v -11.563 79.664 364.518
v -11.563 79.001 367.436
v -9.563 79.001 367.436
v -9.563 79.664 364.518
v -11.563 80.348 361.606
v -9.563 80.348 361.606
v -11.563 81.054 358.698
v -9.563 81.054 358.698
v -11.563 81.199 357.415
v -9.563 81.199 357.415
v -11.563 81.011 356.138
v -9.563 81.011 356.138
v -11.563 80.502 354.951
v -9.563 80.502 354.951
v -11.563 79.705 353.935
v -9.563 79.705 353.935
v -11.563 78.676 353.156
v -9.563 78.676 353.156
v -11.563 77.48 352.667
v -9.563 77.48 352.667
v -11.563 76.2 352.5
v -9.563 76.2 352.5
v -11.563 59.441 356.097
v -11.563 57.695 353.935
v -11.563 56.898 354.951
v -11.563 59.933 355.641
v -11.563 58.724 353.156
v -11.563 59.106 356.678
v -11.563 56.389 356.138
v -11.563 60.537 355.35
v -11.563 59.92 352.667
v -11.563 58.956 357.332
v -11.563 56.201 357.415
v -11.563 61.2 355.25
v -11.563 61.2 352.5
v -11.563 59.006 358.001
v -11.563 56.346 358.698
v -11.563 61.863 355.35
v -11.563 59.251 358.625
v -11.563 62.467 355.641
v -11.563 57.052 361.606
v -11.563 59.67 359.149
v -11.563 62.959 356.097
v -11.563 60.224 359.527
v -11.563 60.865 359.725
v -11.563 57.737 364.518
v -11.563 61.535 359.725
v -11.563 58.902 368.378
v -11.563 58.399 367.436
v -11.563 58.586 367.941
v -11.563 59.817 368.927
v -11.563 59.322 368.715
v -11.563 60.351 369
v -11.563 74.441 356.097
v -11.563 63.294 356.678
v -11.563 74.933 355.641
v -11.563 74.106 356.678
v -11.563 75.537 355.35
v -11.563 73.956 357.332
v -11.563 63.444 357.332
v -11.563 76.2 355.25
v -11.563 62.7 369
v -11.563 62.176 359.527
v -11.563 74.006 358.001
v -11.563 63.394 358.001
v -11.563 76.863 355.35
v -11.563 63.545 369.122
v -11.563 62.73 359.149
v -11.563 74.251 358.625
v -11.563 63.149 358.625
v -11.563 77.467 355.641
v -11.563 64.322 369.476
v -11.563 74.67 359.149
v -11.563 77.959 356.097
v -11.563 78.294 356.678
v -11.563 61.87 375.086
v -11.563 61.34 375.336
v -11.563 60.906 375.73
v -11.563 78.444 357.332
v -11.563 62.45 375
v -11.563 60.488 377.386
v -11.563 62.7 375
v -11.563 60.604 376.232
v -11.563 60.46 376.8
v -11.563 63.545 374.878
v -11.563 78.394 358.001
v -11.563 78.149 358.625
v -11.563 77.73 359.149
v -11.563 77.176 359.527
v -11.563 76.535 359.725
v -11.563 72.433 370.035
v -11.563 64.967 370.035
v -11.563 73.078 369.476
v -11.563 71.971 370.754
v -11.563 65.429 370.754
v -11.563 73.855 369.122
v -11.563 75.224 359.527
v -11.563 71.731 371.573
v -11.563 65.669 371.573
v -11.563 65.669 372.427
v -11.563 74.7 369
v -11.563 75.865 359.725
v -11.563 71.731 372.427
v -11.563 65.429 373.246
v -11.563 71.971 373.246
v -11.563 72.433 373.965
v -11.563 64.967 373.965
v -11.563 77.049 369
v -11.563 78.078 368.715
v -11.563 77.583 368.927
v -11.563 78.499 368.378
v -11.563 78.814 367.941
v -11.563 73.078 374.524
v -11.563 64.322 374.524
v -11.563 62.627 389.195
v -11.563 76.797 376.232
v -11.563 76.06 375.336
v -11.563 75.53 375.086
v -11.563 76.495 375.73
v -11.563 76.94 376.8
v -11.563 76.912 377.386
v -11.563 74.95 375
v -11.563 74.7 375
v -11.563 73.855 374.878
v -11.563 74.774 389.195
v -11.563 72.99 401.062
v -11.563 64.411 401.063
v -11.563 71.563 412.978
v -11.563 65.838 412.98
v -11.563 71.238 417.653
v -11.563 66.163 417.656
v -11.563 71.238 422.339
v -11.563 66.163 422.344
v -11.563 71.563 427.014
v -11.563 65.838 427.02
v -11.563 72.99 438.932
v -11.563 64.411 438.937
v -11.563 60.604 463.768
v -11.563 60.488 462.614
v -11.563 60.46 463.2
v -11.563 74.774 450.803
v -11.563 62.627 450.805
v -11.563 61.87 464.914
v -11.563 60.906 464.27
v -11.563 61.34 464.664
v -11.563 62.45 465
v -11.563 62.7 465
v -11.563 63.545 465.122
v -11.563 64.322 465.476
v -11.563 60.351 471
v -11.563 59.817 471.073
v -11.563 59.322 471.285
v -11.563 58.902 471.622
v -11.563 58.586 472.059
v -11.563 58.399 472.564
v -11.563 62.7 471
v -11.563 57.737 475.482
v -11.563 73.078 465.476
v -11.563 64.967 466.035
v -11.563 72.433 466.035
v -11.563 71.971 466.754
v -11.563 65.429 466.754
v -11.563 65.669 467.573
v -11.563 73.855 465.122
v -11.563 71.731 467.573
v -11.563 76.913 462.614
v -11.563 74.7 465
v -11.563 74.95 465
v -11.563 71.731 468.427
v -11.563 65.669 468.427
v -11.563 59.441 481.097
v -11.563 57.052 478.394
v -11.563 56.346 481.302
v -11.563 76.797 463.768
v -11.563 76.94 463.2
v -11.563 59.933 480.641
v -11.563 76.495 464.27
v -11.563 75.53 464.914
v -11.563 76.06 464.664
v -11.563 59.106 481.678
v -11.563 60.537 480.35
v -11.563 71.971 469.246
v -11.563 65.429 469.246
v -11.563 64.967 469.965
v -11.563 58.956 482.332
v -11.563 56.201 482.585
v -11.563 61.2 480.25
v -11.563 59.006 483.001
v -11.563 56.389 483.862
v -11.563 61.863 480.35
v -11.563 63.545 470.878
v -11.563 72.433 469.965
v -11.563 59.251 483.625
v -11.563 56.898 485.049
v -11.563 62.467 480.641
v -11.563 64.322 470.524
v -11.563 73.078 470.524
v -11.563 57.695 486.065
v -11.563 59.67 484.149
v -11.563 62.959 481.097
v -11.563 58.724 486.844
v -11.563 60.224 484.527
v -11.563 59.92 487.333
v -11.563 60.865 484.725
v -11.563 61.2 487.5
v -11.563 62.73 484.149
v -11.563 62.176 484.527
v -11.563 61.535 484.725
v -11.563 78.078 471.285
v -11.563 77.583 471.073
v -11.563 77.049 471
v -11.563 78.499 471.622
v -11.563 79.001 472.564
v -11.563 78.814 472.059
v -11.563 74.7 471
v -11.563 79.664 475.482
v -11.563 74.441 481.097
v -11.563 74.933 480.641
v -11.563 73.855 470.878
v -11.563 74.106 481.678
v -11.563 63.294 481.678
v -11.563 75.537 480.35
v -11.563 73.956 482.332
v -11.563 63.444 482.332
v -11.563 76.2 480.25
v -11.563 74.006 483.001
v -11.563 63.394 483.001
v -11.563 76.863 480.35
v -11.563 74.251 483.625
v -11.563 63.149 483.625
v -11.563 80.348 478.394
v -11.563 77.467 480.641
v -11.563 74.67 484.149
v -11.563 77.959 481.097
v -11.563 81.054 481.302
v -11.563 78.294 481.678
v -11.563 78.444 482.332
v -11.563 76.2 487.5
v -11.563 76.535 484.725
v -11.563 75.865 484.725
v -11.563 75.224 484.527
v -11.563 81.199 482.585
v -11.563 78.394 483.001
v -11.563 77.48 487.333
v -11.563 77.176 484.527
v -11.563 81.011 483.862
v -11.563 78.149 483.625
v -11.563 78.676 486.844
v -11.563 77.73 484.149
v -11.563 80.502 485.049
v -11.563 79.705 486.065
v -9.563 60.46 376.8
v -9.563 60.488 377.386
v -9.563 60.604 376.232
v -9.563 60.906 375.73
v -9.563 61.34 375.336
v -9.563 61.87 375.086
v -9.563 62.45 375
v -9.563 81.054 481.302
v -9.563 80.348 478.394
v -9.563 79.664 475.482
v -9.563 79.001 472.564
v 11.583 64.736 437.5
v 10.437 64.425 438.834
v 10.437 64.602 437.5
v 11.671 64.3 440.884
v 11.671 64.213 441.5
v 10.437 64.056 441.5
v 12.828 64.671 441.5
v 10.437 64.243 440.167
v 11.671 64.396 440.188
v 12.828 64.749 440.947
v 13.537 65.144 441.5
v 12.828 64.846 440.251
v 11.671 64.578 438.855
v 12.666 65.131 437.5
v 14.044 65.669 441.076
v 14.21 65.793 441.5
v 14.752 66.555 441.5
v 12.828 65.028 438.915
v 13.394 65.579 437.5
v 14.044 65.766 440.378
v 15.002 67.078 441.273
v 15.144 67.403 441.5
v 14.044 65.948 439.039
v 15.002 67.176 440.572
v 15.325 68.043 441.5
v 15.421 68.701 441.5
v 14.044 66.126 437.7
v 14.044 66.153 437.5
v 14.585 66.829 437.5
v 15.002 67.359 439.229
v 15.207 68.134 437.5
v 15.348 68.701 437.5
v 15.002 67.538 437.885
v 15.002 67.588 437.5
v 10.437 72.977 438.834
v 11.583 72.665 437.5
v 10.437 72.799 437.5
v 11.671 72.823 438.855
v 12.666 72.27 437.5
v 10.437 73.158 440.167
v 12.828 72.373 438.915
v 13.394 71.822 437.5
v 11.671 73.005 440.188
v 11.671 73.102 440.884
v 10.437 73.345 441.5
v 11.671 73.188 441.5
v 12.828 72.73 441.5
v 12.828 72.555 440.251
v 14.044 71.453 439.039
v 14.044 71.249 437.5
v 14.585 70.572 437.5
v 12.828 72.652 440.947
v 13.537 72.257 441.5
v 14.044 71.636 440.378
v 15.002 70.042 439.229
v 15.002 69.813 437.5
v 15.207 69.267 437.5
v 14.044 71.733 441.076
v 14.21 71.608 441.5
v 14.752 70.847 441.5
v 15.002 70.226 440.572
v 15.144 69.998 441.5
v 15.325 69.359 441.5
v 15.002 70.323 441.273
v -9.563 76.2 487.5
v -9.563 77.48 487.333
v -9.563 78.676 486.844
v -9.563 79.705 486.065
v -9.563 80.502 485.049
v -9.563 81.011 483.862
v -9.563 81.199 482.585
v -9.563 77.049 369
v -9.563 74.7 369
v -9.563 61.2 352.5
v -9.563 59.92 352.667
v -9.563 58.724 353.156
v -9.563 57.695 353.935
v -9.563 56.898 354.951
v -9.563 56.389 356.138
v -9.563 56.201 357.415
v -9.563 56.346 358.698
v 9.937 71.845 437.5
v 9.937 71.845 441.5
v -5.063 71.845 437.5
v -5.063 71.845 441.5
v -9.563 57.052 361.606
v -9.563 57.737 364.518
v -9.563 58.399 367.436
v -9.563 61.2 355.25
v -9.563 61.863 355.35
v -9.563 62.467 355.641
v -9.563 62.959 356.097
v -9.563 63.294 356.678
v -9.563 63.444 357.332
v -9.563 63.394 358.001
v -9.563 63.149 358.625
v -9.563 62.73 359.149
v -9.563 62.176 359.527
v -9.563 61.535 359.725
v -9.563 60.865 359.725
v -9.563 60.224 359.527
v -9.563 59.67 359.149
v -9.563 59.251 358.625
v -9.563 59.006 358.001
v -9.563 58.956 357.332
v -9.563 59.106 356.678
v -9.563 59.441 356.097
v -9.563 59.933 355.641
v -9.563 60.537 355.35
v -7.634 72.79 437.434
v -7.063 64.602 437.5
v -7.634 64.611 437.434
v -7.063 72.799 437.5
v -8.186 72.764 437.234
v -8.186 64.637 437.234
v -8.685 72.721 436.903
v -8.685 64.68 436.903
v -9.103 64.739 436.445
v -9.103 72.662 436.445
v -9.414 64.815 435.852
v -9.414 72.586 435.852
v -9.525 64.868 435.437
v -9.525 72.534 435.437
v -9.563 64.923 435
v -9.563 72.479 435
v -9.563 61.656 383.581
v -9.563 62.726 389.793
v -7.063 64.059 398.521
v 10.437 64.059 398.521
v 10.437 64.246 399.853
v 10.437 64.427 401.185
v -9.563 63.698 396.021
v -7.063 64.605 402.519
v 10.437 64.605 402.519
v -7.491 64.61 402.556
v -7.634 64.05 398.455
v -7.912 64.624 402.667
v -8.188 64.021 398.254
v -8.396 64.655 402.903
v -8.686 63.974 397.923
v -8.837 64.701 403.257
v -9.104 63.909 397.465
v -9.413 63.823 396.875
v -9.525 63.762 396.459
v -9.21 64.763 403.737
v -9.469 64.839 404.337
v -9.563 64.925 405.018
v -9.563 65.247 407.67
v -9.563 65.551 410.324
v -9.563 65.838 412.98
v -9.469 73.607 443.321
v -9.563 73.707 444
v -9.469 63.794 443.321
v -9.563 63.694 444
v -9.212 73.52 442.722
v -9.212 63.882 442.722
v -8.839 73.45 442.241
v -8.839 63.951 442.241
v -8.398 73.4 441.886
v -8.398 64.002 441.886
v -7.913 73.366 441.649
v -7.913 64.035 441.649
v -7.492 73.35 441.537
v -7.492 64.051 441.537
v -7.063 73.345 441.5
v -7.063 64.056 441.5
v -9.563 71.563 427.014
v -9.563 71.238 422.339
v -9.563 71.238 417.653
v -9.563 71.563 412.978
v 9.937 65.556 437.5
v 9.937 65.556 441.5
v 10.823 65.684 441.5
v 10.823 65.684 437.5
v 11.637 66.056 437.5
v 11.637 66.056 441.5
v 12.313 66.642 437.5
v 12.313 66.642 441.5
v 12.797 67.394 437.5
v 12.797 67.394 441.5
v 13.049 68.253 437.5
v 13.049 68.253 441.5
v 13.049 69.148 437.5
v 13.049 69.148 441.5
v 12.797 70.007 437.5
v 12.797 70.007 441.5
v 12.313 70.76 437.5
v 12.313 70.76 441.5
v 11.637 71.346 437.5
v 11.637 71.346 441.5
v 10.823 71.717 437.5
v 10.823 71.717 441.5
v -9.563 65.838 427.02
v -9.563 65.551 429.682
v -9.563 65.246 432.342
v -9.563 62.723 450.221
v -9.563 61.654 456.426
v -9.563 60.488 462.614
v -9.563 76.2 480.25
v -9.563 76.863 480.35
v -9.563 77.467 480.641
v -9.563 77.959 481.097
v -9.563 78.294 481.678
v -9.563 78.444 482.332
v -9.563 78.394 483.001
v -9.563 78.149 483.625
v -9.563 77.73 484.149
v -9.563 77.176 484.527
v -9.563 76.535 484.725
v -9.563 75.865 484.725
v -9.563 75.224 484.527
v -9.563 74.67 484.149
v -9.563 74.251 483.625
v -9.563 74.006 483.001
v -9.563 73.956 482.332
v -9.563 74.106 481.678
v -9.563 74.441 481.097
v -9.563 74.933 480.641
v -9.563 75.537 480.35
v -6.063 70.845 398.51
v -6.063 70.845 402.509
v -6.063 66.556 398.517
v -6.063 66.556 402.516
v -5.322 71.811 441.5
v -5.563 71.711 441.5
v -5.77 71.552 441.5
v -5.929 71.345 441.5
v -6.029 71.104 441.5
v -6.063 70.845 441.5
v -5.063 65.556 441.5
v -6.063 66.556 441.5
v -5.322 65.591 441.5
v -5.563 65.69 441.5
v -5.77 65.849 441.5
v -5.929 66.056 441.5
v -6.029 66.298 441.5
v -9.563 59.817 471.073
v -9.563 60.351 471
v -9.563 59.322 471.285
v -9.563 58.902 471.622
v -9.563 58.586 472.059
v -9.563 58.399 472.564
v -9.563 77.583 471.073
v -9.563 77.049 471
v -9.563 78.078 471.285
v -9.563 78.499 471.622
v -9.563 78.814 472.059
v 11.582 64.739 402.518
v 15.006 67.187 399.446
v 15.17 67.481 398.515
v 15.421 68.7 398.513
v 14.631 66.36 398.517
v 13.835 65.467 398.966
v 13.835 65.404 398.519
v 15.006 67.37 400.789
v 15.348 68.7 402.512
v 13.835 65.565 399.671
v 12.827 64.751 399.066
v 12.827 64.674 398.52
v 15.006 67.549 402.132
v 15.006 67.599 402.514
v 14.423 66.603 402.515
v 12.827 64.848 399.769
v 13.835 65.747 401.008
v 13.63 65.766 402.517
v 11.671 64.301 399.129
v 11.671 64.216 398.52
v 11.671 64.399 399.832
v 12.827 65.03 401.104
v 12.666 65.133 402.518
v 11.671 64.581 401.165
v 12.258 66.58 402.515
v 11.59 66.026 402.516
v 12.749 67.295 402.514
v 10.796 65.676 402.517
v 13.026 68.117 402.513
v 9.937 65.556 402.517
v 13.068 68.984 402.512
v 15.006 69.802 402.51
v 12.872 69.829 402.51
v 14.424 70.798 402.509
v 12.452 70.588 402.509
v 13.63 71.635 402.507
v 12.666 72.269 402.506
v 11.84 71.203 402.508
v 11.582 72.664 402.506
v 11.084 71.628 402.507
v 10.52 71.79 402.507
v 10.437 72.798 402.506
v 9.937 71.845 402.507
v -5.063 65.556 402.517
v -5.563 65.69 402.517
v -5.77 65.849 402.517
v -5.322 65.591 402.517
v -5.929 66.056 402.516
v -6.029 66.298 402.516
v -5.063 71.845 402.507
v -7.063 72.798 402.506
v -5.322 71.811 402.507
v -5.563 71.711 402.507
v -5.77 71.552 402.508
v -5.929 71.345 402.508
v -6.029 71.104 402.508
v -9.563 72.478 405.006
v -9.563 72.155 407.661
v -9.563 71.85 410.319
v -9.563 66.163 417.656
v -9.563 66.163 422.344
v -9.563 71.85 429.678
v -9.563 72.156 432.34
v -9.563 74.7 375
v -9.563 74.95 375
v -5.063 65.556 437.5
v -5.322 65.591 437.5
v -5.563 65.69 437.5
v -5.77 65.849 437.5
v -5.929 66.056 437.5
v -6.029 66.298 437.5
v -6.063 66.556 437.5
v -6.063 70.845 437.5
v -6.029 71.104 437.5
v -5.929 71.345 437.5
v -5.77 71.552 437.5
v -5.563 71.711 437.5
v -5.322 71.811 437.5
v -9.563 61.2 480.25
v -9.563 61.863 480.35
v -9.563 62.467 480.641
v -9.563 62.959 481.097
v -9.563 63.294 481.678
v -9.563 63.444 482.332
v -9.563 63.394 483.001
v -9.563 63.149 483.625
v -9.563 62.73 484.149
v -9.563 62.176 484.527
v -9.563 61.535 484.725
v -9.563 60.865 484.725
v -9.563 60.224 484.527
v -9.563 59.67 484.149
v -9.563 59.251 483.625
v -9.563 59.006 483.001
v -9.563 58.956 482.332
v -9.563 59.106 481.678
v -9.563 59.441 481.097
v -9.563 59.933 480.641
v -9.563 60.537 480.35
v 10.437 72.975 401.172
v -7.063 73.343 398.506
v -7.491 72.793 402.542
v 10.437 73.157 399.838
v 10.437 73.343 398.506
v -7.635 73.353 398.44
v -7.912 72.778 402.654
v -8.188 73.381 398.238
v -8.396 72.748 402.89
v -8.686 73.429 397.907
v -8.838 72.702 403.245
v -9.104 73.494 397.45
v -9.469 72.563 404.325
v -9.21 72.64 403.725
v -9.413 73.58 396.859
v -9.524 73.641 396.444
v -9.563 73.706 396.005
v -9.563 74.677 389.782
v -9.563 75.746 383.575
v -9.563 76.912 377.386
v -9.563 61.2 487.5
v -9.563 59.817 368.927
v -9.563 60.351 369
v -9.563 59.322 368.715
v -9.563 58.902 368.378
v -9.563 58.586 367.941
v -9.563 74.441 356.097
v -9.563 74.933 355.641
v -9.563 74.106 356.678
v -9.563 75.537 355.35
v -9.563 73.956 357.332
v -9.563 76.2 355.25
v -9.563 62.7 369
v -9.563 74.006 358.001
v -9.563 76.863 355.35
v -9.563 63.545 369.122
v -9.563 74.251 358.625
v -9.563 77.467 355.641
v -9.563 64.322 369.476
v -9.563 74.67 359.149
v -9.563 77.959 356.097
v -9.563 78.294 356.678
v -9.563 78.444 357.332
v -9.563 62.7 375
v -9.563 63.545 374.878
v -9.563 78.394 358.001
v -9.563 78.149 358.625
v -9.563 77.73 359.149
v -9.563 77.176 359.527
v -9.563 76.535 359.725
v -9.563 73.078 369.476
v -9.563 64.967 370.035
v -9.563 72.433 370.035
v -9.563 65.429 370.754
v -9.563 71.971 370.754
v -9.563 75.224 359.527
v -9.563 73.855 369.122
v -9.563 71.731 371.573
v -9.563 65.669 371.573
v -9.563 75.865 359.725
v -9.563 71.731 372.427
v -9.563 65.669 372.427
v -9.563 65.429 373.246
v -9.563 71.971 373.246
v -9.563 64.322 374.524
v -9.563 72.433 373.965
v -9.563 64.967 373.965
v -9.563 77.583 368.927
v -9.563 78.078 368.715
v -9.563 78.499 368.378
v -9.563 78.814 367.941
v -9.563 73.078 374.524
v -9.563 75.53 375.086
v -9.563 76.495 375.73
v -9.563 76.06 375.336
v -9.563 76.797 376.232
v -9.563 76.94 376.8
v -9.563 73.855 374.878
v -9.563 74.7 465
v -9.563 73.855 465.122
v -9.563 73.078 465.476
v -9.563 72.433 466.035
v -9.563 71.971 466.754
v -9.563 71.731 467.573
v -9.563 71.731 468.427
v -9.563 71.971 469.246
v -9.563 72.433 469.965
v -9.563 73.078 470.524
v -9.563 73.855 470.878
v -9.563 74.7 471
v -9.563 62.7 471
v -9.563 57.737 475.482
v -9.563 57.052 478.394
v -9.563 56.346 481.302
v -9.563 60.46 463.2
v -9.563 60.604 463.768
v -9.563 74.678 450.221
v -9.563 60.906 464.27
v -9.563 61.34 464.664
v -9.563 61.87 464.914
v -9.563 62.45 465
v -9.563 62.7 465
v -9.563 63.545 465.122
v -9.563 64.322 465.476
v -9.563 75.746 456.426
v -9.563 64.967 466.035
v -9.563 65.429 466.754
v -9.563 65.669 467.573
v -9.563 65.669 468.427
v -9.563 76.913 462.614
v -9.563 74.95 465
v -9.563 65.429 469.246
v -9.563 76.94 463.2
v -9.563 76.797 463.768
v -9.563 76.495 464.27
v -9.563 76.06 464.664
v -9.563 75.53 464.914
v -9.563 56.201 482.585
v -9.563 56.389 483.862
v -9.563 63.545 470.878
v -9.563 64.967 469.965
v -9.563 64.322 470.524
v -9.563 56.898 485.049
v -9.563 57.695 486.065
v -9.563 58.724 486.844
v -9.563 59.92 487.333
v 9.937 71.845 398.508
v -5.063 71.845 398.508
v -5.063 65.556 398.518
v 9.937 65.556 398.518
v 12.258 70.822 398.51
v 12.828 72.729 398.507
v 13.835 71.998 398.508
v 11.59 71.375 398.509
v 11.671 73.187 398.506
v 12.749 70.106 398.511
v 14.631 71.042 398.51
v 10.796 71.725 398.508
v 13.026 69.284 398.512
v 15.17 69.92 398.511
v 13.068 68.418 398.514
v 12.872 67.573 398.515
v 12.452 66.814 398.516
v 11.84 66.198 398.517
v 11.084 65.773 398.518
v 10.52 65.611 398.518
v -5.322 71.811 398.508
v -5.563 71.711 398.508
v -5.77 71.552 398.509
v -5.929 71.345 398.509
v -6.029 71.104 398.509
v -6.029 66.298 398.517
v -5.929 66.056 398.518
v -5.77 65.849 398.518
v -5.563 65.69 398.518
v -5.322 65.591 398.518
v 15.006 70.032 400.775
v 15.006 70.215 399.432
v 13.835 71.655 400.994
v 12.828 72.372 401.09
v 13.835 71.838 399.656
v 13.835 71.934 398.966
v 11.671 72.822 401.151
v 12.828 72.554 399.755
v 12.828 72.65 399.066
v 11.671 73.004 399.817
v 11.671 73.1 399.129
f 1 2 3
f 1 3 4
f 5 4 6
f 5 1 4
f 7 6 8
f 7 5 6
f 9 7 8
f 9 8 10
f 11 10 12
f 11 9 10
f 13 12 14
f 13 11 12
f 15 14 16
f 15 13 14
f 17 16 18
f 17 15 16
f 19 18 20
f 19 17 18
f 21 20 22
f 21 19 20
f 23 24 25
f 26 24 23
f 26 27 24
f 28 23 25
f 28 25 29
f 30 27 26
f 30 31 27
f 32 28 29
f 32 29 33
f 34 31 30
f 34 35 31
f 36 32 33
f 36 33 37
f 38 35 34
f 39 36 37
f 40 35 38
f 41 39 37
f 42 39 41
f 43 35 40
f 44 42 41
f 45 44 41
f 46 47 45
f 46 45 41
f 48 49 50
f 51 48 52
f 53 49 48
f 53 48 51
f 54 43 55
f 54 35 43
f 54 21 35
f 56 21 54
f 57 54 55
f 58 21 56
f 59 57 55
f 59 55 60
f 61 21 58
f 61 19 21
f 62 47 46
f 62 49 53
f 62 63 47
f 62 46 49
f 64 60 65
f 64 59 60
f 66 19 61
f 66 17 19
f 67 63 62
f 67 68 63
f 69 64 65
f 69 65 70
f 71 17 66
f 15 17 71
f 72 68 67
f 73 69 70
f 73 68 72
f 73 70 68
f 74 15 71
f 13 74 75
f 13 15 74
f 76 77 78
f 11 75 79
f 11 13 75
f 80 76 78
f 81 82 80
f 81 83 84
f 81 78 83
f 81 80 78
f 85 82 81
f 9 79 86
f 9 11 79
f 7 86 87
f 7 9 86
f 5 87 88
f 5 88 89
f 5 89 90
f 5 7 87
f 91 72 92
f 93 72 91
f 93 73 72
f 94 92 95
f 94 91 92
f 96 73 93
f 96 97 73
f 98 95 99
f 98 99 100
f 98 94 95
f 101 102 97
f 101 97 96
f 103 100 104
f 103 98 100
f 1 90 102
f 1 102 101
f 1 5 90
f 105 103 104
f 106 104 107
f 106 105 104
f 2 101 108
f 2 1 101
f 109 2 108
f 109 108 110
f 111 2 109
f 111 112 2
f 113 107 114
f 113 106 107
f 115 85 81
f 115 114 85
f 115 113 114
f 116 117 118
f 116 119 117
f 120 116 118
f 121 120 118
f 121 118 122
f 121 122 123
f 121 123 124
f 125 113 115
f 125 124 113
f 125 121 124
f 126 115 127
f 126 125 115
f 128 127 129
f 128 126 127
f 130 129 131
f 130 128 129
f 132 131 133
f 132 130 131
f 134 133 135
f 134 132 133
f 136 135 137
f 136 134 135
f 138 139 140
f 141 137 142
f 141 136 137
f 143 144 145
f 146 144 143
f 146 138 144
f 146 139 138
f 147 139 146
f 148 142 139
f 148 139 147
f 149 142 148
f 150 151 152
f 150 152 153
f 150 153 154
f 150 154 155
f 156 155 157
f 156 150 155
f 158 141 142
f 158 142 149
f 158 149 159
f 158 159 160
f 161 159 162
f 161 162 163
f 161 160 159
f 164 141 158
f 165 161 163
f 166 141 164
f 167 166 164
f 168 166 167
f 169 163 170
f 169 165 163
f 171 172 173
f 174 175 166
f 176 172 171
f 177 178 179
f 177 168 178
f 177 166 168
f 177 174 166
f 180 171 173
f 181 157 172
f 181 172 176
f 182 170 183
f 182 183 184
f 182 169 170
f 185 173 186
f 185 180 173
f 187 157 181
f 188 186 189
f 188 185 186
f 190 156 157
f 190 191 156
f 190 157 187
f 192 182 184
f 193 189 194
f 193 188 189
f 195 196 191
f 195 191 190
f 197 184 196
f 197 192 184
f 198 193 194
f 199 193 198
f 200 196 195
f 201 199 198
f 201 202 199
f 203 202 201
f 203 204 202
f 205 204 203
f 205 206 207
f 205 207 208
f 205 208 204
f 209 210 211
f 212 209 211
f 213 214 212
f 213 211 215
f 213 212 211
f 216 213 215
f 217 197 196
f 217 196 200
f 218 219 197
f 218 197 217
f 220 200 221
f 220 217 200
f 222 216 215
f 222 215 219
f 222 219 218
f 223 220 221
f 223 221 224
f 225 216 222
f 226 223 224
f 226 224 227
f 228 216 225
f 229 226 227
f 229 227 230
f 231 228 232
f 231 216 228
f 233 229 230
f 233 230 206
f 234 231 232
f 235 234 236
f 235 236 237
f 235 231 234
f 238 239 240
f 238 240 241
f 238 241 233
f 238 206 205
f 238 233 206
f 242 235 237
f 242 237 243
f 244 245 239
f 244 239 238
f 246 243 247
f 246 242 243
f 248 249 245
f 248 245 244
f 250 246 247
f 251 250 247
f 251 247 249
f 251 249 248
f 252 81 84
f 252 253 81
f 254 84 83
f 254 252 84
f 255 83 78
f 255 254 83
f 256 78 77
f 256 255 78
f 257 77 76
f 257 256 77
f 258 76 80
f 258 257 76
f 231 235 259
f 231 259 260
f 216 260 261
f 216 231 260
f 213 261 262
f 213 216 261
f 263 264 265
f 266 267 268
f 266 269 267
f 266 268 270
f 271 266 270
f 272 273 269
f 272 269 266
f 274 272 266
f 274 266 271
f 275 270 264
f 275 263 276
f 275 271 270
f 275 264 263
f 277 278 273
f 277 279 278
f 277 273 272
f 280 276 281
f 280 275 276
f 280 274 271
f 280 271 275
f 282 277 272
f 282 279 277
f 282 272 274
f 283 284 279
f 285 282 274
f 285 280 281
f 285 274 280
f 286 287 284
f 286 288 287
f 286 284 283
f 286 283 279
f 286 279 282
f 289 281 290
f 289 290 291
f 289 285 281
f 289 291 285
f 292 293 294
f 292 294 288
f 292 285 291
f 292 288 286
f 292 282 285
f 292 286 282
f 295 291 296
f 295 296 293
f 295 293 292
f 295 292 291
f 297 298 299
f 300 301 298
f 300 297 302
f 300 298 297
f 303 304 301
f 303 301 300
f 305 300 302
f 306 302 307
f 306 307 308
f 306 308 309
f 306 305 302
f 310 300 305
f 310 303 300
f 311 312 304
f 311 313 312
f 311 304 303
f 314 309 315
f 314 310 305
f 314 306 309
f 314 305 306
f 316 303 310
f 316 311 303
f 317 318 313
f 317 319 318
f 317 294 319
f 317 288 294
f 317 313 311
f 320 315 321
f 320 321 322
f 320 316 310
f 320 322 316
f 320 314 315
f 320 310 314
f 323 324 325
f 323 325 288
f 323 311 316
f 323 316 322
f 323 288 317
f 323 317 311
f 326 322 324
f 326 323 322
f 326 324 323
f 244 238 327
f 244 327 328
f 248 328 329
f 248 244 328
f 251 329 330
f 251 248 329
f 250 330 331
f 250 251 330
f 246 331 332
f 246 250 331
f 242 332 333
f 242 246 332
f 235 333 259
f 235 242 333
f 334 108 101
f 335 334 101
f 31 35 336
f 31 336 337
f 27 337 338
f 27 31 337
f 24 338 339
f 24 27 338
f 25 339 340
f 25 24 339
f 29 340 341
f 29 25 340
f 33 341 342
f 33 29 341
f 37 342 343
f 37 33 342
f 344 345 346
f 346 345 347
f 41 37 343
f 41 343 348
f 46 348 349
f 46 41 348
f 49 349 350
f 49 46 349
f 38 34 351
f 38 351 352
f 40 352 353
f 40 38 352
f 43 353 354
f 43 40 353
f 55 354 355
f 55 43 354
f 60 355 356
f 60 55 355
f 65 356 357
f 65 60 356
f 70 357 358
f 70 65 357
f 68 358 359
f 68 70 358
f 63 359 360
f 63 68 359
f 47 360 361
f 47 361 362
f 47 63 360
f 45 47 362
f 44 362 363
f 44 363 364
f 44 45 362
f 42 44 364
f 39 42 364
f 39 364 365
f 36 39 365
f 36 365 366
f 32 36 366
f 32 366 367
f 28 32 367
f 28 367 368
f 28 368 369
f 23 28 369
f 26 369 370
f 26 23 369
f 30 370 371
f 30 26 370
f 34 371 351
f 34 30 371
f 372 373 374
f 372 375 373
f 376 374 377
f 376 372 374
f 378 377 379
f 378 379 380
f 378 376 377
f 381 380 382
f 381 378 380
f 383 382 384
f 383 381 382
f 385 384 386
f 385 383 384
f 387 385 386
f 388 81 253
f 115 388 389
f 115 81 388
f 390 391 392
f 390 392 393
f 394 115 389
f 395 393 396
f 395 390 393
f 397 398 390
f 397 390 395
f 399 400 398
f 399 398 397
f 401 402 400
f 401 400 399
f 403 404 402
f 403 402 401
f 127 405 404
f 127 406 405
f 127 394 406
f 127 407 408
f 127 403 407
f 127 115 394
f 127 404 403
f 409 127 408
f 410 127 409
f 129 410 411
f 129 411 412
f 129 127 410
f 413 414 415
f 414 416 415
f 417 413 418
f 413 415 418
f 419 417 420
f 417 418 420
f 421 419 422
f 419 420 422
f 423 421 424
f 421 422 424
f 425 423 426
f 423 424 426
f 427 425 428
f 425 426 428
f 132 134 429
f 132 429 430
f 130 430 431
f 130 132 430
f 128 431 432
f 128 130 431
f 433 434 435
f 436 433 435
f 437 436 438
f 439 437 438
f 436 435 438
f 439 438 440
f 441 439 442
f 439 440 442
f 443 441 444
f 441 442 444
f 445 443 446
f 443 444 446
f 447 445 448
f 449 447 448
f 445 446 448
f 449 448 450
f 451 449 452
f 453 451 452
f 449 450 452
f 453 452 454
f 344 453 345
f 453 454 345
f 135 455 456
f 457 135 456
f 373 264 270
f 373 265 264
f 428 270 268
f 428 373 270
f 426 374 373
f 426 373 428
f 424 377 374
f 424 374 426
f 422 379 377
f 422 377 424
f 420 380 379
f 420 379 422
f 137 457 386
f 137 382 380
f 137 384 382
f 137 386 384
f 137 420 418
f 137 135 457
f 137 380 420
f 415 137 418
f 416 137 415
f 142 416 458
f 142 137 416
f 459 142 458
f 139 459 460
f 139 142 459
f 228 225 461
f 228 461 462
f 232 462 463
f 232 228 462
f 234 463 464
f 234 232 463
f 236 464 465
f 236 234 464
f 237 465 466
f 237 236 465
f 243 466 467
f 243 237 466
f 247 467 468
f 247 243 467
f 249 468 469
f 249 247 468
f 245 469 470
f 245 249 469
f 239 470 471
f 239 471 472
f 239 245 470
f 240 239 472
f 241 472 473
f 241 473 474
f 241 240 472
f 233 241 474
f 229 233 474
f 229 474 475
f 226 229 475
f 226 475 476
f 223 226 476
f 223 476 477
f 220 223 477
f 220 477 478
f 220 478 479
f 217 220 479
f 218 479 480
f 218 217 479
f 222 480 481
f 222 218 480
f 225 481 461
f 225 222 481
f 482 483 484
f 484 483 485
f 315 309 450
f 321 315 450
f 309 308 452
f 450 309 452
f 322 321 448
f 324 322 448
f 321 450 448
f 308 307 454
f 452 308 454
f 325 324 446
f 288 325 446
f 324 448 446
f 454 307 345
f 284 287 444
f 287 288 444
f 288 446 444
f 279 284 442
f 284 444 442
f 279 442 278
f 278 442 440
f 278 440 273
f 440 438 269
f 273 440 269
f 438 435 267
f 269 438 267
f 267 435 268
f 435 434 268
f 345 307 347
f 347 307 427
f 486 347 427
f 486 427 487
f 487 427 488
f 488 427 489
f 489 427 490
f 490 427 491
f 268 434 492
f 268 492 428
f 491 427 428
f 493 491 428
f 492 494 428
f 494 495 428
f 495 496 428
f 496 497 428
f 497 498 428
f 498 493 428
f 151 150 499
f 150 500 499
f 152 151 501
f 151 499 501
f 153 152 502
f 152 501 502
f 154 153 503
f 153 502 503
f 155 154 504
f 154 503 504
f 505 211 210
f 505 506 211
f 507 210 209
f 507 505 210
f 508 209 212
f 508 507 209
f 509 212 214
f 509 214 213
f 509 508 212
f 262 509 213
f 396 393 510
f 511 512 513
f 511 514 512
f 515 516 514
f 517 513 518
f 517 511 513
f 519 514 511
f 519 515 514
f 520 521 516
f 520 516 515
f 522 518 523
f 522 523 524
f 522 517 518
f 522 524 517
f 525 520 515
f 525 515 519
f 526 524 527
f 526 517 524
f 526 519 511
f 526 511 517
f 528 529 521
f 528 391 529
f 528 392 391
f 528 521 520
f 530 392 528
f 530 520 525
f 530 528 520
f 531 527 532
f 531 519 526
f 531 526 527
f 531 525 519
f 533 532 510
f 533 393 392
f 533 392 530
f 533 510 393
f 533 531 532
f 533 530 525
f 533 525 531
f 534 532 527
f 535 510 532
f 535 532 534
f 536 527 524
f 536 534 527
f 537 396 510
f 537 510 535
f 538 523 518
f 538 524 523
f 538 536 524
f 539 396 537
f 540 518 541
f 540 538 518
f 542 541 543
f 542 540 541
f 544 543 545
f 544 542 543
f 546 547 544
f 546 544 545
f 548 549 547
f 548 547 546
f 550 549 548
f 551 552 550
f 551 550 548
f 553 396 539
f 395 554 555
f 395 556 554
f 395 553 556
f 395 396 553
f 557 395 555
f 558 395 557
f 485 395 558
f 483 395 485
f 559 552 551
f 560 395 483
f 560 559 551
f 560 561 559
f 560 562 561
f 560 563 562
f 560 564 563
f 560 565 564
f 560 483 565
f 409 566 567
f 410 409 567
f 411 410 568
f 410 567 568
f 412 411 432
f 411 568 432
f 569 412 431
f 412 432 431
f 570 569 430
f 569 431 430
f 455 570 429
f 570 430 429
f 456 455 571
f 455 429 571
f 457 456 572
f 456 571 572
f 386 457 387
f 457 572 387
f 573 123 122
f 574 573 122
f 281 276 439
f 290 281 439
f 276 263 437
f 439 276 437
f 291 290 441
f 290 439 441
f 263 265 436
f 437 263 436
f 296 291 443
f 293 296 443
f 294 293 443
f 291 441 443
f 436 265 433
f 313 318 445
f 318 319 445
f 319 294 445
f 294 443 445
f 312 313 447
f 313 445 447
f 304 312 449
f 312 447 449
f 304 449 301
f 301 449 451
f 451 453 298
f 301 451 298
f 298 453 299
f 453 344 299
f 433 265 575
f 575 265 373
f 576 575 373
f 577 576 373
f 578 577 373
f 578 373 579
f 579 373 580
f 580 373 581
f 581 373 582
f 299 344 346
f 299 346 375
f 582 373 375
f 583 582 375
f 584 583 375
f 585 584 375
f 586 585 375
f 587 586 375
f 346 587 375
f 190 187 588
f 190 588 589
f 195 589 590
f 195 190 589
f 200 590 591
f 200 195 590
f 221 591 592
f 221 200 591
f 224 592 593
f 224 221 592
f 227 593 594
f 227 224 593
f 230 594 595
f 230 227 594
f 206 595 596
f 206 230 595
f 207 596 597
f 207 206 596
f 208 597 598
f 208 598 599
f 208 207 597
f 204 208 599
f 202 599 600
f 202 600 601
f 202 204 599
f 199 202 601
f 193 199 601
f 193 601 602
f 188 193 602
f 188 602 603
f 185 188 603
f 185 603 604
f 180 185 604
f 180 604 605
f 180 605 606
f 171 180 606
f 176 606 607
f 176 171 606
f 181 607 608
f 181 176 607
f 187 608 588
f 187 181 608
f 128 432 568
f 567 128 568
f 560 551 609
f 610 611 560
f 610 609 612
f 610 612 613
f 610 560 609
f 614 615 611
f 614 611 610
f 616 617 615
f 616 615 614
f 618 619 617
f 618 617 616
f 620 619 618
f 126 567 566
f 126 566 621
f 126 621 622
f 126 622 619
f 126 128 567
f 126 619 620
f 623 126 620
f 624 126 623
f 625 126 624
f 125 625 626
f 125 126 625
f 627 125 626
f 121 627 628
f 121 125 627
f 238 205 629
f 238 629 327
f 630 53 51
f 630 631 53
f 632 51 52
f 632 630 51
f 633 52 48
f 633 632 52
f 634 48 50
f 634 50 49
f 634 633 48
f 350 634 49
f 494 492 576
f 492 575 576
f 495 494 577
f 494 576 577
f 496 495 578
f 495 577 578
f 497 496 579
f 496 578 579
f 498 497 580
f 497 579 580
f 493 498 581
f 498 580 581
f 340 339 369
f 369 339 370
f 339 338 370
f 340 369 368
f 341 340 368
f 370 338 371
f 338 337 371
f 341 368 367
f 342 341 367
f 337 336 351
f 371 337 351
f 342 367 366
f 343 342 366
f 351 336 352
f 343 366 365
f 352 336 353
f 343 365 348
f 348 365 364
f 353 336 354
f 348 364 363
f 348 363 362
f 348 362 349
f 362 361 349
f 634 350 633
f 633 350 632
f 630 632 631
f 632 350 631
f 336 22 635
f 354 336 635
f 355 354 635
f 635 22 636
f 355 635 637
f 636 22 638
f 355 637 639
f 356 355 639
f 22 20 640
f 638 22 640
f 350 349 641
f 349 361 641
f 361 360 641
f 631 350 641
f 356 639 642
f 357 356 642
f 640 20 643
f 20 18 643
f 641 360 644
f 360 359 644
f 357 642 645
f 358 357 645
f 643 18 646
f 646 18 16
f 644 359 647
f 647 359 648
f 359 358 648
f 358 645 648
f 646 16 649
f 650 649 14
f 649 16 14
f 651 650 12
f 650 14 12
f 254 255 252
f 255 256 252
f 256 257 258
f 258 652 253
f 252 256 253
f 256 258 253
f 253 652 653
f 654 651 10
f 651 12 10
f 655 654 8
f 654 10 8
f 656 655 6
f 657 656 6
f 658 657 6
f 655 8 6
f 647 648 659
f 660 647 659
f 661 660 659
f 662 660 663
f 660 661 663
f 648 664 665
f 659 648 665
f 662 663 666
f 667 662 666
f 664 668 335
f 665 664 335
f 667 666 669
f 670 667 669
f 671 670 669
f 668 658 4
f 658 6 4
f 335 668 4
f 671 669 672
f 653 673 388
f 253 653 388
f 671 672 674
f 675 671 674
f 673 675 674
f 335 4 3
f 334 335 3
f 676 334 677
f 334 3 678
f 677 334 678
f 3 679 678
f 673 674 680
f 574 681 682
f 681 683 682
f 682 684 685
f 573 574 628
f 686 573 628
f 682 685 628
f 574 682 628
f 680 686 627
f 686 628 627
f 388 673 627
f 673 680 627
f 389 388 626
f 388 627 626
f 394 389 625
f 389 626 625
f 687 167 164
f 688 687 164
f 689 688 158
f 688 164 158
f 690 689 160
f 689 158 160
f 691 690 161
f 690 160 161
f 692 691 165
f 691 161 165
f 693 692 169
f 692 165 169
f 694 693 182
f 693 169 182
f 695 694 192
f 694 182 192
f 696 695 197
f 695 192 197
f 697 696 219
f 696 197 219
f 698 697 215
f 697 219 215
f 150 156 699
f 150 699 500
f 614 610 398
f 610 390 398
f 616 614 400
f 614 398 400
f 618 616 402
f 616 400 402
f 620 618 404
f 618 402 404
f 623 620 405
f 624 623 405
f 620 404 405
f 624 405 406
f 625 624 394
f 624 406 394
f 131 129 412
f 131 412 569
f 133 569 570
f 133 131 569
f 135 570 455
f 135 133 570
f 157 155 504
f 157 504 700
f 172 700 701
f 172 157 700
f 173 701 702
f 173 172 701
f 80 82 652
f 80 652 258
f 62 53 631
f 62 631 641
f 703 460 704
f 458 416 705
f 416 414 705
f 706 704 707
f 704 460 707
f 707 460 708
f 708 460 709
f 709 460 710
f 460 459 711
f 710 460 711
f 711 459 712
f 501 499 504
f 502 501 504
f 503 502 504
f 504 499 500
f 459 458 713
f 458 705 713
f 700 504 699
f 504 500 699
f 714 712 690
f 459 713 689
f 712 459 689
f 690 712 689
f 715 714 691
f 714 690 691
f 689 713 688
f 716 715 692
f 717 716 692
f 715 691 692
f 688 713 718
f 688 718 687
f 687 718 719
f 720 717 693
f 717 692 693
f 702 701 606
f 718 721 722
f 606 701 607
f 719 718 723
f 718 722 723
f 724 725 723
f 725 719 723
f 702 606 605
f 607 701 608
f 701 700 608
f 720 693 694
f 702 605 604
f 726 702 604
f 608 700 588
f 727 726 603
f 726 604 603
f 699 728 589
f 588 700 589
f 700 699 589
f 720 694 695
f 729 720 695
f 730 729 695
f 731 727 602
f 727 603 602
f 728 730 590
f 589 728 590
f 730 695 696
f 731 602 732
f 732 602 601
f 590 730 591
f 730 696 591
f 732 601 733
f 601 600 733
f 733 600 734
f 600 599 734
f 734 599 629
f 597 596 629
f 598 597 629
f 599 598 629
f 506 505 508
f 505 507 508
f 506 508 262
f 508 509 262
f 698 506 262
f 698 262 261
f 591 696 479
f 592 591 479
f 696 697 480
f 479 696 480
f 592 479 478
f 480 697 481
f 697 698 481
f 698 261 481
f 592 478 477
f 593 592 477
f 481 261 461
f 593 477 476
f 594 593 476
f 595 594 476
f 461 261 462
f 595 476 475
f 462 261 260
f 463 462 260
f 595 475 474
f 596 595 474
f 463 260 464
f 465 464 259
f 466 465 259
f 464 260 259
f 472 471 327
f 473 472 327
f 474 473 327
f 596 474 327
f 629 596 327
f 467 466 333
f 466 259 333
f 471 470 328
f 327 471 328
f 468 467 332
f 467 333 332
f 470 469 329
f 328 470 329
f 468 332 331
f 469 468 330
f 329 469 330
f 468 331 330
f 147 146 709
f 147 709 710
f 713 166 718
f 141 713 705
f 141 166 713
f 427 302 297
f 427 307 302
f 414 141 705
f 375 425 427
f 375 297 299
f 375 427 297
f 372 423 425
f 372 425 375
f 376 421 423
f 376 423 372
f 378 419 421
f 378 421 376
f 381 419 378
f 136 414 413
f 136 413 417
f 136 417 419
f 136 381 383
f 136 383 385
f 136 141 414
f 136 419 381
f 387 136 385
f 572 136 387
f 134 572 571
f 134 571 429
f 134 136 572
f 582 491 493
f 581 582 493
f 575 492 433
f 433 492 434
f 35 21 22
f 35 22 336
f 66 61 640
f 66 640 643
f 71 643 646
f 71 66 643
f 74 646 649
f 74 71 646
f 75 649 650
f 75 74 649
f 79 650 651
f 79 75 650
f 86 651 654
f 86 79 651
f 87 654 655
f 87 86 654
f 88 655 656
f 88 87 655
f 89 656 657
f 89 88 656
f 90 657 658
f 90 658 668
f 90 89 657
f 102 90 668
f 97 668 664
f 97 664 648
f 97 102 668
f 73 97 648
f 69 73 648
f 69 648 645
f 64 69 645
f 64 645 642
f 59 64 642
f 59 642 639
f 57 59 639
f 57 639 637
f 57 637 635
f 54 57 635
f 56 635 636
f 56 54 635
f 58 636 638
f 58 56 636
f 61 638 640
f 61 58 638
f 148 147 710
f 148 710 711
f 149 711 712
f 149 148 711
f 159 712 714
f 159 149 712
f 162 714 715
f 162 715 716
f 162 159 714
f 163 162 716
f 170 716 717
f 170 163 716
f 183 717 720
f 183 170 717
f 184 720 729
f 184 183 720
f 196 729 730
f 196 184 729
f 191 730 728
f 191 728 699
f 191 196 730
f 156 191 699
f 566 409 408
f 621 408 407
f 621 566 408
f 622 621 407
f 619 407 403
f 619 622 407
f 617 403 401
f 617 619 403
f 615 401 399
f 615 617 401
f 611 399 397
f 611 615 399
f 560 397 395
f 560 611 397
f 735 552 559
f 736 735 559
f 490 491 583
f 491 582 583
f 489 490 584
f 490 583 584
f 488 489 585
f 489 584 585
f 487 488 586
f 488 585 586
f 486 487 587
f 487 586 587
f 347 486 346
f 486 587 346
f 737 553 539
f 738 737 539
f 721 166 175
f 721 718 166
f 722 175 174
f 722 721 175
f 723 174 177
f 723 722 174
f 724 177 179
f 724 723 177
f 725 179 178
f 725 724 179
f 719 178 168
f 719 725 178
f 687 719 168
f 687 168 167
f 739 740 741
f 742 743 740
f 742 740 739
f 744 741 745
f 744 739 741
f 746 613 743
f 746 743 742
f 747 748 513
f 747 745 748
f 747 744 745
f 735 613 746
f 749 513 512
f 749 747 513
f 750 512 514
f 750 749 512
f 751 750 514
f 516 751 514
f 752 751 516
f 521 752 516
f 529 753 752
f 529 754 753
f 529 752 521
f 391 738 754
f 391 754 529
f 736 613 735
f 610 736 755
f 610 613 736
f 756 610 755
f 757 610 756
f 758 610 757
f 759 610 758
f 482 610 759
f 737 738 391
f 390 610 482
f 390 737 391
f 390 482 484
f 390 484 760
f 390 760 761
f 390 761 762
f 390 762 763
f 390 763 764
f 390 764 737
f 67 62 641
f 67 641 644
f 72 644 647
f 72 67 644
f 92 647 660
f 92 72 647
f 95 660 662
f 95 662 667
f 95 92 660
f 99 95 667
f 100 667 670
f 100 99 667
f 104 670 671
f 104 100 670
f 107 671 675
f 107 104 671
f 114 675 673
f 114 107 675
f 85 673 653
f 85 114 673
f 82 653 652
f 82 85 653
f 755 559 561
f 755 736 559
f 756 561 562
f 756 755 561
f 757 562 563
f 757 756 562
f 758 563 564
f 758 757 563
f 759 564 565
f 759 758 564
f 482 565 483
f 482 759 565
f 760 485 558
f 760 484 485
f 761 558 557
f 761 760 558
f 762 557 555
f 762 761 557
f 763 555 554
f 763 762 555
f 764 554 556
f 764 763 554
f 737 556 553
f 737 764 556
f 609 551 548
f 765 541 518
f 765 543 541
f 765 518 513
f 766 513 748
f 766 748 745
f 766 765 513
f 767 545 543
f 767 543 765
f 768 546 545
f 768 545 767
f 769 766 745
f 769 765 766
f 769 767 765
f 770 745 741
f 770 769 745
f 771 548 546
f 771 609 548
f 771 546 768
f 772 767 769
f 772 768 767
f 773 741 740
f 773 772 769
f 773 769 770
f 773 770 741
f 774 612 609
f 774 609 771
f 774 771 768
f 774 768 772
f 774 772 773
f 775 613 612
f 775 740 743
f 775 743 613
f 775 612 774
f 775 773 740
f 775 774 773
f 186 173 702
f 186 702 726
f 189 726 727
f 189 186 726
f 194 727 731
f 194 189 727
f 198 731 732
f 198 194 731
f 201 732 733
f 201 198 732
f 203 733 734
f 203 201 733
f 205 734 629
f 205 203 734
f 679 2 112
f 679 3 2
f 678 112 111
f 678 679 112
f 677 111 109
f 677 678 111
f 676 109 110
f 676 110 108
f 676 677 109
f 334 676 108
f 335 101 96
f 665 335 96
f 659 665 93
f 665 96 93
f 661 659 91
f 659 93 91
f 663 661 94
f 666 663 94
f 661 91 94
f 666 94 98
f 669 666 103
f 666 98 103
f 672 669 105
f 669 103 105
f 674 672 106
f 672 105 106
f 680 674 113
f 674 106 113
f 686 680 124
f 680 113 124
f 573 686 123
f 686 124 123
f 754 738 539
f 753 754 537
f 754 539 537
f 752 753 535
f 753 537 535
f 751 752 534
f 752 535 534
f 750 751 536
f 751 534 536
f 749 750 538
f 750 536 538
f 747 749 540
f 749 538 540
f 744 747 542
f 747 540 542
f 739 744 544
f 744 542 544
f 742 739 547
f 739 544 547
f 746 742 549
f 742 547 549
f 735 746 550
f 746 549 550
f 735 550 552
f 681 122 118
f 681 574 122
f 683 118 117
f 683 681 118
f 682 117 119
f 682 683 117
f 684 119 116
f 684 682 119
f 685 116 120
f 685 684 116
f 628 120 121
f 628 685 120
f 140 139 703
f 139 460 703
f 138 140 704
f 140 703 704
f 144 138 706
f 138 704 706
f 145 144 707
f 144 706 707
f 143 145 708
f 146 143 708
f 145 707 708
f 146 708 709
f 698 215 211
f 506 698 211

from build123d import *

# Parameters (mm, degrees)
SALIENTE_EXTRUIR1_DEPTH = 2
CORTAR_EXTRUIR1_START   = -2
CROQUIS2_R              = 2.2499999999999543
CROQUIS2_R_2            = 2.2499999999999525
CORTAR_EXTRUIR1_DEPTH   = 2
SALIENTE_EXTRUIR2_DEPTH = 25
REDONDEO1_R             = 5
REDONDEO2_R             = 2.5
CORTAR_EXTRUIR2_DEPTH   = 150
REDONDEO3_R             = 1
REDONDEO4_R             = 2


with BuildPart() as part:
    # Croquis1 → Saliente-Extruir1 (new body)
    with BuildSketch(Plane(origin=(-11.563192139466418, 0, 0), x_dir=(0, 0, -1), z_dir=(1, 0, 0))):
        with BuildLine():
            Line((-487.50000000000006, 61.20002010491962), (-487.50000000000006, 76.20002010491963))
            ThreePointArc((-487.50000000000006, 76.20002010491963), (-485.5828732625374, 80.13650234762473), (-481.3016430211471, 81.05429044671504))
            ThreePointArc((-481.3016430211471, 81.05429044671504), (-454.3213610685335, 75.37256140046077), (-427.01376608968735, 71.56297931460594))
            ThreePointArc((-427.01376608968735, 71.56297931460594), (-419.99597330488047, 71.19728769059765), (-412.9781919309264, 71.56319822849083))
            ThreePointArc((-412.9781919309264, 71.56319822849083), (-385.6746727662309, 75.37294023507445), (-358.6984109055162, 81.05427713370786))
            ThreePointArc((-358.6984109055162, 81.05427713370786), (-354.4171486029636, 80.13651947158925), (-352.50000000000006, 76.20002010491963))
            Line((-352.50000000000006, 76.20002010491963), (-352.50000000000006, 61.20002010491962))
            ThreePointArc((-352.50000000000006, 61.20002010491962), (-354.41718437935106, 57.26349272039885), (-358.698499139633, 56.3457848600743))
            ThreePointArc((-358.698499139633, 56.3457848600743), (-385.67550243814526, 62.027759813352475), (-412.9798133969885, 65.8380287540453))
            ThreePointArc((-412.9798133969885, 65.8380287540453), (-420, 66.20405869011226), (-427.02018660301155, 65.83802875404524))
            ThreePointArc((-427.02018660301155, 65.83802875404524), (-454.3244975618549, 62.027759813352304), (-481.3015008603671, 56.34578486007424))
            ThreePointArc((-481.3015008603671, 56.34578486007424), (-485.5828156206491, 57.2634927203988), (-487.50000000000006, 61.20002010491962))
        make_face()
    extrude(amount=SALIENTE_EXTRUIR1_DEPTH)

    # Croquis2 → Cortar-Extruir1 (cut)
    with BuildSketch(Plane(origin=(-9.563192139466418, 0, 0), x_dir=(0, 0, -1), z_dir=(1, 0, 0)).offset(CORTAR_EXTRUIR1_START)):
        with Locations((-357.50000000000006, 61.20002010491962)):
            Circle(CROQUIS2_R)
        with Locations((-482.50000000000006, 61.20002010491962)):
            Circle(CROQUIS2_R)
        with Locations((-482.50000000000006, 76.20002010491963)):
            Circle(CROQUIS2_R_2)
        with Locations((-357.50000000000006, 76.20002010491963)):
            Circle(CROQUIS2_R_2)
        with BuildLine():
            Line((-471.00000000000006, 74.70002010491963), (-471.00000000000006, 78.65520707766471))
            ThreePointArc((-471.00000000000006, 78.65520707766471), (-468.00242565546085, 78.0108082929201), (-465, 77.3894050999363))
            Line((-465, 77.3894050999363), (-465, 74.70002010491963))
            ThreePointArc((-465, 74.70002010491963), (-468, 71.70002010491957), (-471.00000000000006, 74.70002010491963))
        make_face()
        with BuildLine():
            Line((-471.00000000000006, 62.70002010491962), (-471.00000000000006, 58.745154173439786))
            ThreePointArc((-471.00000000000006, 58.745154173439786), (-468.0024260238705, 59.38964522535156), (-465, 60.011140542750915))
            Line((-465, 60.011140542750915), (-465, 62.70002010491962))
            ThreePointArc((-465, 62.70002010491962), (-468, 65.70002010491962), (-471.00000000000006, 62.70002010491962))
        make_face()
        with BuildLine():
            Line((-375.00000000000006, 74.70002010492064), (-375.00000000000006, 77.3892133718565))
            ThreePointArc((-375.00000000000006, 77.3892133718565), (-371.9975742047899, 78.0106515107218), (-369.00000000000006, 78.65508529549625))
            Line((-369.00000000000006, 78.65508529549625), (-369.00000000000006, 74.70002010492064))
            ThreePointArc((-369.00000000000006, 74.70002010492064), (-372.00000000000006, 71.70002010492064), (-375.00000000000006, 74.70002010492064))
        make_face()
        with BuildLine():
            Line((-375.00000000000006, 62.700020104920625), (-375.00000000000006, 60.01114054275103))
            ThreePointArc((-375.00000000000006, 60.01114054275103), (-371.9975739761297, 59.38964522535167), (-369.00000000000006, 58.74515417343995))
            Line((-369.00000000000006, 58.74515417343995), (-369.00000000000006, 62.700020104920625))
            ThreePointArc((-369.00000000000006, 62.700020104920625), (-372.00000000000006, 65.70002010492063), (-375.00000000000006, 62.700020104920625))
        make_face()
    extrude(amount=CORTAR_EXTRUIR1_DEPTH, mode=Mode.SUBTRACT)

    # Croquis3 → Saliente-Extruir2 (add)
    with BuildSketch(Plane(origin=(-9.563192139466418, 0, 0), x_dir=(0, 0, -1), z_dir=(1, 0, 0))):
        with BuildLine():
            Line((-441.5, 73.34478345263268), (-441.5, 64.0564693169966))
            ThreePointArc((-441.5, 64.0564693169966), (-439.500688579451, 64.33441688299206), (-437.50000000000006, 64.60227172023619))
            Line((-437.50000000000006, 64.60227172023619), (-437.50000000000006, 72.79909943134032))
            ThreePointArc((-437.50000000000006, 72.79909943134032), (-439.5006884273723, 73.06689509761537), (-441.5, 73.34478345263268))
        make_face()
        with BuildLine():
            Line((-402.51863522626155, 64.60471833694513), (-402.5055085249573, 72.7978713543057))
            ThreePointArc((-402.5055085249573, 72.7978713543057), (-400.5049833223084, 73.06563889552336), (-398.50583471542444, 73.34349747494228))
            Line((-398.50583471542444, 73.34349747494228), (-398.52070927713964, 64.05940108438512))
            ThreePointArc((-398.52070927713964, 64.05940108438512), (-400.5189846456923, 64.33710080901727), (-402.51863522626155, 64.60471833694513))
        make_face()
    extrude(amount=SALIENTE_EXTRUIR2_DEPTH)

    # Redondeo1
    # the kernel refuses this fillet: 5 mm, written as the material it takes off along each edge
    with BuildSketch(Plane(origin=(15.436807860533582, -331.99303473076, 454.57843031070206), x_dir=(0, 0.9852688696585968, -0.17101243955242207), z_dir=(0, -0.17101243955242207, -0.9852688696585968))) as redondeo1_piece_1:
        with BuildLine():
            CenterArc((400.0000000032307 + REDONDEO1_R, -REDONDEO1_R), REDONDEO1_R, 90, 90)
            Line((400.0000000032307 + REDONDEO1_R, 0), (400.0000000032307, 0))
            Line((400.0000000032307, 0), (400.0000000032307, -REDONDEO1_R))
        make_face()
    revolve(axis=Axis((15.436807860533582, -331.99303473076, 454.57843031070206), (1, 0, 0)), revolution_arc=4.158952056224013, mode=Mode.SUBTRACT)
    with BuildSketch(Plane(origin=(15.436807860533582, 469.39483943387535, 454.5712833464088), x_dir=(0, -0.9950753091360283, -0.09912178947051785), z_dir=(0, -0.09912178947051785, 0.9950753091360283))) as redondeo1_piece_2:
        with BuildLine():
            CenterArc((399.9999999970836 + REDONDEO1_R, -REDONDEO1_R), REDONDEO1_R, 90, 90)
            Line((399.9999999970836 + REDONDEO1_R, 0), (399.9999999970836, 0))
            Line((399.9999999970836, 0), (399.9999999970836, -REDONDEO1_R))
        make_face()
    revolve(axis=Axis((15.436807860533582, 469.39483943387535, 454.5712833464088), (1, 0, 0)), revolution_arc=4.159206104487057, mode=Mode.SUBTRACT)
    with BuildSketch(Plane(origin=(15.436807860533582, 469.3959177926432, 385.43308471259814), x_dir=(0, -0.9950750240944541, 0.09912465093719791), z_dir=(0, -0.09912465093719791, -0.9950750240944541))) as redondeo1_piece_3:
        with BuildLine():
            CenterArc((400.0000000023156 + REDONDEO1_R, REDONDEO1_R), REDONDEO1_R, 180, 90)
            Line((400.0000000023156 + REDONDEO1_R, 0), (400.0000000023156, 0))
            Line((400.0000000023156, 0), (400.0000000023156, REDONDEO1_R))
        make_face()
    revolve(axis=Axis((15.436807860533582, 469.3959177926432, 385.43308471259814), (-1, 0, 0)), revolution_arc=4.159253520630329, mode=Mode.SUBTRACT)
    with BuildSketch(Plane(origin=(15.436807860533582, -331.99303472992847, 385.4215696894115), x_dir=(0, 0.9852599261695624, 0.1710639584610054), z_dir=(0, -0.1710639584610054, 0.9852599261695624))) as redondeo1_piece_4:
        with BuildLine():
            CenterArc((400.00000000239186 + REDONDEO1_R, REDONDEO1_R), REDONDEO1_R, 180, 90)
            Line((400.00000000239186 + REDONDEO1_R, 0), (400.00000000239186, 0))
            Line((400.00000000239186, 0), (400.00000000239186, REDONDEO1_R))
        make_face()
    revolve(axis=Axis((15.436807860533582, -331.99303472992847, 385.4215696894115), (-1, 0, 0)), revolution_arc=4.159255812959428, mode=Mode.SUBTRACT)

    # Redondeo2
    redondeo2_edges = [part.edges().sort_by_distance(p)[0] for p in [
        (-9.563192139466418, 68.70062638481464, 441.5),
        (-9.563192139466418, 68.70068557578826, 437.50000000000006),
        (-9.563192139466418, 68.7014492796637, 398.51327199628207),
        (-9.563192139466418, 68.70129484562541, 402.5120718756094),
    ]]
    fillet(redondeo2_edges, radius=REDONDEO2_R)

    # Croquis4 → Cortar-Extruir2 (cut)
    with BuildSketch(Plane.XY.offset(441.5)):
        with BuildLine():
            Line((9.936807860533582, 71.84478345263268), (-6.063192139466418, 71.84478345263268))
            Line((-6.063192139466418, 71.84478345263268), (-6.063192139466418, 65.5564693169966))
            Line((-6.063192139466418, 65.5564693169966), (9.936807860533582, 65.55646931699658))
            ThreePointArc((9.936807860533582, 65.55646931699658), (13.080964928351639, 68.70062638481464), (9.936807860533582, 71.84478345263268))
        make_face()
    extrude(amount=-CORTAR_EXTRUIR2_DEPTH, mode=Mode.SUBTRACT)

    # Redondeo3
    redondeo3_edges = [part.edges().sort_by_distance(p)[0] for p in [
        (-6.063192139466418, 65.5564693169966, 439.5),
        (-6.063192139466418, 65.5564693169966, 400.51771055769314),
        (-6.063192139466418, 71.84478345263268, 439.5),
        (-6.063192139466418, 71.84478345263268, 400.5076357035813),
    ]]
    fillet(redondeo3_edges, radius=REDONDEO3_R)

    # Redondeo4
    redondeo4_edges = [part.edges().sort_by_distance(p)[0] for p in [
        (-10.563192139466418, 58.74515417343996, 369.00000000000006),
        (-10.563192139466418, 60.011140542751036, 375.00000000000006),
        (-10.563192139466418, 77.38921337185644, 375),
        (-10.563192139466418, 78.6550852954962, 369.00000000000006),
        (-10.563192139466418, 60.01114054275092, 465),
        (-10.563192139466418, 58.74515417343982, 471.00000000000006),
        (-10.563192139466418, 78.6552070776647, 471.00000000000006),
        (-10.563192139466418, 77.38940509993628, 465),
    ]]
    fillet(redondeo4_edges, radius=REDONDEO4_R)


solid = part.part
